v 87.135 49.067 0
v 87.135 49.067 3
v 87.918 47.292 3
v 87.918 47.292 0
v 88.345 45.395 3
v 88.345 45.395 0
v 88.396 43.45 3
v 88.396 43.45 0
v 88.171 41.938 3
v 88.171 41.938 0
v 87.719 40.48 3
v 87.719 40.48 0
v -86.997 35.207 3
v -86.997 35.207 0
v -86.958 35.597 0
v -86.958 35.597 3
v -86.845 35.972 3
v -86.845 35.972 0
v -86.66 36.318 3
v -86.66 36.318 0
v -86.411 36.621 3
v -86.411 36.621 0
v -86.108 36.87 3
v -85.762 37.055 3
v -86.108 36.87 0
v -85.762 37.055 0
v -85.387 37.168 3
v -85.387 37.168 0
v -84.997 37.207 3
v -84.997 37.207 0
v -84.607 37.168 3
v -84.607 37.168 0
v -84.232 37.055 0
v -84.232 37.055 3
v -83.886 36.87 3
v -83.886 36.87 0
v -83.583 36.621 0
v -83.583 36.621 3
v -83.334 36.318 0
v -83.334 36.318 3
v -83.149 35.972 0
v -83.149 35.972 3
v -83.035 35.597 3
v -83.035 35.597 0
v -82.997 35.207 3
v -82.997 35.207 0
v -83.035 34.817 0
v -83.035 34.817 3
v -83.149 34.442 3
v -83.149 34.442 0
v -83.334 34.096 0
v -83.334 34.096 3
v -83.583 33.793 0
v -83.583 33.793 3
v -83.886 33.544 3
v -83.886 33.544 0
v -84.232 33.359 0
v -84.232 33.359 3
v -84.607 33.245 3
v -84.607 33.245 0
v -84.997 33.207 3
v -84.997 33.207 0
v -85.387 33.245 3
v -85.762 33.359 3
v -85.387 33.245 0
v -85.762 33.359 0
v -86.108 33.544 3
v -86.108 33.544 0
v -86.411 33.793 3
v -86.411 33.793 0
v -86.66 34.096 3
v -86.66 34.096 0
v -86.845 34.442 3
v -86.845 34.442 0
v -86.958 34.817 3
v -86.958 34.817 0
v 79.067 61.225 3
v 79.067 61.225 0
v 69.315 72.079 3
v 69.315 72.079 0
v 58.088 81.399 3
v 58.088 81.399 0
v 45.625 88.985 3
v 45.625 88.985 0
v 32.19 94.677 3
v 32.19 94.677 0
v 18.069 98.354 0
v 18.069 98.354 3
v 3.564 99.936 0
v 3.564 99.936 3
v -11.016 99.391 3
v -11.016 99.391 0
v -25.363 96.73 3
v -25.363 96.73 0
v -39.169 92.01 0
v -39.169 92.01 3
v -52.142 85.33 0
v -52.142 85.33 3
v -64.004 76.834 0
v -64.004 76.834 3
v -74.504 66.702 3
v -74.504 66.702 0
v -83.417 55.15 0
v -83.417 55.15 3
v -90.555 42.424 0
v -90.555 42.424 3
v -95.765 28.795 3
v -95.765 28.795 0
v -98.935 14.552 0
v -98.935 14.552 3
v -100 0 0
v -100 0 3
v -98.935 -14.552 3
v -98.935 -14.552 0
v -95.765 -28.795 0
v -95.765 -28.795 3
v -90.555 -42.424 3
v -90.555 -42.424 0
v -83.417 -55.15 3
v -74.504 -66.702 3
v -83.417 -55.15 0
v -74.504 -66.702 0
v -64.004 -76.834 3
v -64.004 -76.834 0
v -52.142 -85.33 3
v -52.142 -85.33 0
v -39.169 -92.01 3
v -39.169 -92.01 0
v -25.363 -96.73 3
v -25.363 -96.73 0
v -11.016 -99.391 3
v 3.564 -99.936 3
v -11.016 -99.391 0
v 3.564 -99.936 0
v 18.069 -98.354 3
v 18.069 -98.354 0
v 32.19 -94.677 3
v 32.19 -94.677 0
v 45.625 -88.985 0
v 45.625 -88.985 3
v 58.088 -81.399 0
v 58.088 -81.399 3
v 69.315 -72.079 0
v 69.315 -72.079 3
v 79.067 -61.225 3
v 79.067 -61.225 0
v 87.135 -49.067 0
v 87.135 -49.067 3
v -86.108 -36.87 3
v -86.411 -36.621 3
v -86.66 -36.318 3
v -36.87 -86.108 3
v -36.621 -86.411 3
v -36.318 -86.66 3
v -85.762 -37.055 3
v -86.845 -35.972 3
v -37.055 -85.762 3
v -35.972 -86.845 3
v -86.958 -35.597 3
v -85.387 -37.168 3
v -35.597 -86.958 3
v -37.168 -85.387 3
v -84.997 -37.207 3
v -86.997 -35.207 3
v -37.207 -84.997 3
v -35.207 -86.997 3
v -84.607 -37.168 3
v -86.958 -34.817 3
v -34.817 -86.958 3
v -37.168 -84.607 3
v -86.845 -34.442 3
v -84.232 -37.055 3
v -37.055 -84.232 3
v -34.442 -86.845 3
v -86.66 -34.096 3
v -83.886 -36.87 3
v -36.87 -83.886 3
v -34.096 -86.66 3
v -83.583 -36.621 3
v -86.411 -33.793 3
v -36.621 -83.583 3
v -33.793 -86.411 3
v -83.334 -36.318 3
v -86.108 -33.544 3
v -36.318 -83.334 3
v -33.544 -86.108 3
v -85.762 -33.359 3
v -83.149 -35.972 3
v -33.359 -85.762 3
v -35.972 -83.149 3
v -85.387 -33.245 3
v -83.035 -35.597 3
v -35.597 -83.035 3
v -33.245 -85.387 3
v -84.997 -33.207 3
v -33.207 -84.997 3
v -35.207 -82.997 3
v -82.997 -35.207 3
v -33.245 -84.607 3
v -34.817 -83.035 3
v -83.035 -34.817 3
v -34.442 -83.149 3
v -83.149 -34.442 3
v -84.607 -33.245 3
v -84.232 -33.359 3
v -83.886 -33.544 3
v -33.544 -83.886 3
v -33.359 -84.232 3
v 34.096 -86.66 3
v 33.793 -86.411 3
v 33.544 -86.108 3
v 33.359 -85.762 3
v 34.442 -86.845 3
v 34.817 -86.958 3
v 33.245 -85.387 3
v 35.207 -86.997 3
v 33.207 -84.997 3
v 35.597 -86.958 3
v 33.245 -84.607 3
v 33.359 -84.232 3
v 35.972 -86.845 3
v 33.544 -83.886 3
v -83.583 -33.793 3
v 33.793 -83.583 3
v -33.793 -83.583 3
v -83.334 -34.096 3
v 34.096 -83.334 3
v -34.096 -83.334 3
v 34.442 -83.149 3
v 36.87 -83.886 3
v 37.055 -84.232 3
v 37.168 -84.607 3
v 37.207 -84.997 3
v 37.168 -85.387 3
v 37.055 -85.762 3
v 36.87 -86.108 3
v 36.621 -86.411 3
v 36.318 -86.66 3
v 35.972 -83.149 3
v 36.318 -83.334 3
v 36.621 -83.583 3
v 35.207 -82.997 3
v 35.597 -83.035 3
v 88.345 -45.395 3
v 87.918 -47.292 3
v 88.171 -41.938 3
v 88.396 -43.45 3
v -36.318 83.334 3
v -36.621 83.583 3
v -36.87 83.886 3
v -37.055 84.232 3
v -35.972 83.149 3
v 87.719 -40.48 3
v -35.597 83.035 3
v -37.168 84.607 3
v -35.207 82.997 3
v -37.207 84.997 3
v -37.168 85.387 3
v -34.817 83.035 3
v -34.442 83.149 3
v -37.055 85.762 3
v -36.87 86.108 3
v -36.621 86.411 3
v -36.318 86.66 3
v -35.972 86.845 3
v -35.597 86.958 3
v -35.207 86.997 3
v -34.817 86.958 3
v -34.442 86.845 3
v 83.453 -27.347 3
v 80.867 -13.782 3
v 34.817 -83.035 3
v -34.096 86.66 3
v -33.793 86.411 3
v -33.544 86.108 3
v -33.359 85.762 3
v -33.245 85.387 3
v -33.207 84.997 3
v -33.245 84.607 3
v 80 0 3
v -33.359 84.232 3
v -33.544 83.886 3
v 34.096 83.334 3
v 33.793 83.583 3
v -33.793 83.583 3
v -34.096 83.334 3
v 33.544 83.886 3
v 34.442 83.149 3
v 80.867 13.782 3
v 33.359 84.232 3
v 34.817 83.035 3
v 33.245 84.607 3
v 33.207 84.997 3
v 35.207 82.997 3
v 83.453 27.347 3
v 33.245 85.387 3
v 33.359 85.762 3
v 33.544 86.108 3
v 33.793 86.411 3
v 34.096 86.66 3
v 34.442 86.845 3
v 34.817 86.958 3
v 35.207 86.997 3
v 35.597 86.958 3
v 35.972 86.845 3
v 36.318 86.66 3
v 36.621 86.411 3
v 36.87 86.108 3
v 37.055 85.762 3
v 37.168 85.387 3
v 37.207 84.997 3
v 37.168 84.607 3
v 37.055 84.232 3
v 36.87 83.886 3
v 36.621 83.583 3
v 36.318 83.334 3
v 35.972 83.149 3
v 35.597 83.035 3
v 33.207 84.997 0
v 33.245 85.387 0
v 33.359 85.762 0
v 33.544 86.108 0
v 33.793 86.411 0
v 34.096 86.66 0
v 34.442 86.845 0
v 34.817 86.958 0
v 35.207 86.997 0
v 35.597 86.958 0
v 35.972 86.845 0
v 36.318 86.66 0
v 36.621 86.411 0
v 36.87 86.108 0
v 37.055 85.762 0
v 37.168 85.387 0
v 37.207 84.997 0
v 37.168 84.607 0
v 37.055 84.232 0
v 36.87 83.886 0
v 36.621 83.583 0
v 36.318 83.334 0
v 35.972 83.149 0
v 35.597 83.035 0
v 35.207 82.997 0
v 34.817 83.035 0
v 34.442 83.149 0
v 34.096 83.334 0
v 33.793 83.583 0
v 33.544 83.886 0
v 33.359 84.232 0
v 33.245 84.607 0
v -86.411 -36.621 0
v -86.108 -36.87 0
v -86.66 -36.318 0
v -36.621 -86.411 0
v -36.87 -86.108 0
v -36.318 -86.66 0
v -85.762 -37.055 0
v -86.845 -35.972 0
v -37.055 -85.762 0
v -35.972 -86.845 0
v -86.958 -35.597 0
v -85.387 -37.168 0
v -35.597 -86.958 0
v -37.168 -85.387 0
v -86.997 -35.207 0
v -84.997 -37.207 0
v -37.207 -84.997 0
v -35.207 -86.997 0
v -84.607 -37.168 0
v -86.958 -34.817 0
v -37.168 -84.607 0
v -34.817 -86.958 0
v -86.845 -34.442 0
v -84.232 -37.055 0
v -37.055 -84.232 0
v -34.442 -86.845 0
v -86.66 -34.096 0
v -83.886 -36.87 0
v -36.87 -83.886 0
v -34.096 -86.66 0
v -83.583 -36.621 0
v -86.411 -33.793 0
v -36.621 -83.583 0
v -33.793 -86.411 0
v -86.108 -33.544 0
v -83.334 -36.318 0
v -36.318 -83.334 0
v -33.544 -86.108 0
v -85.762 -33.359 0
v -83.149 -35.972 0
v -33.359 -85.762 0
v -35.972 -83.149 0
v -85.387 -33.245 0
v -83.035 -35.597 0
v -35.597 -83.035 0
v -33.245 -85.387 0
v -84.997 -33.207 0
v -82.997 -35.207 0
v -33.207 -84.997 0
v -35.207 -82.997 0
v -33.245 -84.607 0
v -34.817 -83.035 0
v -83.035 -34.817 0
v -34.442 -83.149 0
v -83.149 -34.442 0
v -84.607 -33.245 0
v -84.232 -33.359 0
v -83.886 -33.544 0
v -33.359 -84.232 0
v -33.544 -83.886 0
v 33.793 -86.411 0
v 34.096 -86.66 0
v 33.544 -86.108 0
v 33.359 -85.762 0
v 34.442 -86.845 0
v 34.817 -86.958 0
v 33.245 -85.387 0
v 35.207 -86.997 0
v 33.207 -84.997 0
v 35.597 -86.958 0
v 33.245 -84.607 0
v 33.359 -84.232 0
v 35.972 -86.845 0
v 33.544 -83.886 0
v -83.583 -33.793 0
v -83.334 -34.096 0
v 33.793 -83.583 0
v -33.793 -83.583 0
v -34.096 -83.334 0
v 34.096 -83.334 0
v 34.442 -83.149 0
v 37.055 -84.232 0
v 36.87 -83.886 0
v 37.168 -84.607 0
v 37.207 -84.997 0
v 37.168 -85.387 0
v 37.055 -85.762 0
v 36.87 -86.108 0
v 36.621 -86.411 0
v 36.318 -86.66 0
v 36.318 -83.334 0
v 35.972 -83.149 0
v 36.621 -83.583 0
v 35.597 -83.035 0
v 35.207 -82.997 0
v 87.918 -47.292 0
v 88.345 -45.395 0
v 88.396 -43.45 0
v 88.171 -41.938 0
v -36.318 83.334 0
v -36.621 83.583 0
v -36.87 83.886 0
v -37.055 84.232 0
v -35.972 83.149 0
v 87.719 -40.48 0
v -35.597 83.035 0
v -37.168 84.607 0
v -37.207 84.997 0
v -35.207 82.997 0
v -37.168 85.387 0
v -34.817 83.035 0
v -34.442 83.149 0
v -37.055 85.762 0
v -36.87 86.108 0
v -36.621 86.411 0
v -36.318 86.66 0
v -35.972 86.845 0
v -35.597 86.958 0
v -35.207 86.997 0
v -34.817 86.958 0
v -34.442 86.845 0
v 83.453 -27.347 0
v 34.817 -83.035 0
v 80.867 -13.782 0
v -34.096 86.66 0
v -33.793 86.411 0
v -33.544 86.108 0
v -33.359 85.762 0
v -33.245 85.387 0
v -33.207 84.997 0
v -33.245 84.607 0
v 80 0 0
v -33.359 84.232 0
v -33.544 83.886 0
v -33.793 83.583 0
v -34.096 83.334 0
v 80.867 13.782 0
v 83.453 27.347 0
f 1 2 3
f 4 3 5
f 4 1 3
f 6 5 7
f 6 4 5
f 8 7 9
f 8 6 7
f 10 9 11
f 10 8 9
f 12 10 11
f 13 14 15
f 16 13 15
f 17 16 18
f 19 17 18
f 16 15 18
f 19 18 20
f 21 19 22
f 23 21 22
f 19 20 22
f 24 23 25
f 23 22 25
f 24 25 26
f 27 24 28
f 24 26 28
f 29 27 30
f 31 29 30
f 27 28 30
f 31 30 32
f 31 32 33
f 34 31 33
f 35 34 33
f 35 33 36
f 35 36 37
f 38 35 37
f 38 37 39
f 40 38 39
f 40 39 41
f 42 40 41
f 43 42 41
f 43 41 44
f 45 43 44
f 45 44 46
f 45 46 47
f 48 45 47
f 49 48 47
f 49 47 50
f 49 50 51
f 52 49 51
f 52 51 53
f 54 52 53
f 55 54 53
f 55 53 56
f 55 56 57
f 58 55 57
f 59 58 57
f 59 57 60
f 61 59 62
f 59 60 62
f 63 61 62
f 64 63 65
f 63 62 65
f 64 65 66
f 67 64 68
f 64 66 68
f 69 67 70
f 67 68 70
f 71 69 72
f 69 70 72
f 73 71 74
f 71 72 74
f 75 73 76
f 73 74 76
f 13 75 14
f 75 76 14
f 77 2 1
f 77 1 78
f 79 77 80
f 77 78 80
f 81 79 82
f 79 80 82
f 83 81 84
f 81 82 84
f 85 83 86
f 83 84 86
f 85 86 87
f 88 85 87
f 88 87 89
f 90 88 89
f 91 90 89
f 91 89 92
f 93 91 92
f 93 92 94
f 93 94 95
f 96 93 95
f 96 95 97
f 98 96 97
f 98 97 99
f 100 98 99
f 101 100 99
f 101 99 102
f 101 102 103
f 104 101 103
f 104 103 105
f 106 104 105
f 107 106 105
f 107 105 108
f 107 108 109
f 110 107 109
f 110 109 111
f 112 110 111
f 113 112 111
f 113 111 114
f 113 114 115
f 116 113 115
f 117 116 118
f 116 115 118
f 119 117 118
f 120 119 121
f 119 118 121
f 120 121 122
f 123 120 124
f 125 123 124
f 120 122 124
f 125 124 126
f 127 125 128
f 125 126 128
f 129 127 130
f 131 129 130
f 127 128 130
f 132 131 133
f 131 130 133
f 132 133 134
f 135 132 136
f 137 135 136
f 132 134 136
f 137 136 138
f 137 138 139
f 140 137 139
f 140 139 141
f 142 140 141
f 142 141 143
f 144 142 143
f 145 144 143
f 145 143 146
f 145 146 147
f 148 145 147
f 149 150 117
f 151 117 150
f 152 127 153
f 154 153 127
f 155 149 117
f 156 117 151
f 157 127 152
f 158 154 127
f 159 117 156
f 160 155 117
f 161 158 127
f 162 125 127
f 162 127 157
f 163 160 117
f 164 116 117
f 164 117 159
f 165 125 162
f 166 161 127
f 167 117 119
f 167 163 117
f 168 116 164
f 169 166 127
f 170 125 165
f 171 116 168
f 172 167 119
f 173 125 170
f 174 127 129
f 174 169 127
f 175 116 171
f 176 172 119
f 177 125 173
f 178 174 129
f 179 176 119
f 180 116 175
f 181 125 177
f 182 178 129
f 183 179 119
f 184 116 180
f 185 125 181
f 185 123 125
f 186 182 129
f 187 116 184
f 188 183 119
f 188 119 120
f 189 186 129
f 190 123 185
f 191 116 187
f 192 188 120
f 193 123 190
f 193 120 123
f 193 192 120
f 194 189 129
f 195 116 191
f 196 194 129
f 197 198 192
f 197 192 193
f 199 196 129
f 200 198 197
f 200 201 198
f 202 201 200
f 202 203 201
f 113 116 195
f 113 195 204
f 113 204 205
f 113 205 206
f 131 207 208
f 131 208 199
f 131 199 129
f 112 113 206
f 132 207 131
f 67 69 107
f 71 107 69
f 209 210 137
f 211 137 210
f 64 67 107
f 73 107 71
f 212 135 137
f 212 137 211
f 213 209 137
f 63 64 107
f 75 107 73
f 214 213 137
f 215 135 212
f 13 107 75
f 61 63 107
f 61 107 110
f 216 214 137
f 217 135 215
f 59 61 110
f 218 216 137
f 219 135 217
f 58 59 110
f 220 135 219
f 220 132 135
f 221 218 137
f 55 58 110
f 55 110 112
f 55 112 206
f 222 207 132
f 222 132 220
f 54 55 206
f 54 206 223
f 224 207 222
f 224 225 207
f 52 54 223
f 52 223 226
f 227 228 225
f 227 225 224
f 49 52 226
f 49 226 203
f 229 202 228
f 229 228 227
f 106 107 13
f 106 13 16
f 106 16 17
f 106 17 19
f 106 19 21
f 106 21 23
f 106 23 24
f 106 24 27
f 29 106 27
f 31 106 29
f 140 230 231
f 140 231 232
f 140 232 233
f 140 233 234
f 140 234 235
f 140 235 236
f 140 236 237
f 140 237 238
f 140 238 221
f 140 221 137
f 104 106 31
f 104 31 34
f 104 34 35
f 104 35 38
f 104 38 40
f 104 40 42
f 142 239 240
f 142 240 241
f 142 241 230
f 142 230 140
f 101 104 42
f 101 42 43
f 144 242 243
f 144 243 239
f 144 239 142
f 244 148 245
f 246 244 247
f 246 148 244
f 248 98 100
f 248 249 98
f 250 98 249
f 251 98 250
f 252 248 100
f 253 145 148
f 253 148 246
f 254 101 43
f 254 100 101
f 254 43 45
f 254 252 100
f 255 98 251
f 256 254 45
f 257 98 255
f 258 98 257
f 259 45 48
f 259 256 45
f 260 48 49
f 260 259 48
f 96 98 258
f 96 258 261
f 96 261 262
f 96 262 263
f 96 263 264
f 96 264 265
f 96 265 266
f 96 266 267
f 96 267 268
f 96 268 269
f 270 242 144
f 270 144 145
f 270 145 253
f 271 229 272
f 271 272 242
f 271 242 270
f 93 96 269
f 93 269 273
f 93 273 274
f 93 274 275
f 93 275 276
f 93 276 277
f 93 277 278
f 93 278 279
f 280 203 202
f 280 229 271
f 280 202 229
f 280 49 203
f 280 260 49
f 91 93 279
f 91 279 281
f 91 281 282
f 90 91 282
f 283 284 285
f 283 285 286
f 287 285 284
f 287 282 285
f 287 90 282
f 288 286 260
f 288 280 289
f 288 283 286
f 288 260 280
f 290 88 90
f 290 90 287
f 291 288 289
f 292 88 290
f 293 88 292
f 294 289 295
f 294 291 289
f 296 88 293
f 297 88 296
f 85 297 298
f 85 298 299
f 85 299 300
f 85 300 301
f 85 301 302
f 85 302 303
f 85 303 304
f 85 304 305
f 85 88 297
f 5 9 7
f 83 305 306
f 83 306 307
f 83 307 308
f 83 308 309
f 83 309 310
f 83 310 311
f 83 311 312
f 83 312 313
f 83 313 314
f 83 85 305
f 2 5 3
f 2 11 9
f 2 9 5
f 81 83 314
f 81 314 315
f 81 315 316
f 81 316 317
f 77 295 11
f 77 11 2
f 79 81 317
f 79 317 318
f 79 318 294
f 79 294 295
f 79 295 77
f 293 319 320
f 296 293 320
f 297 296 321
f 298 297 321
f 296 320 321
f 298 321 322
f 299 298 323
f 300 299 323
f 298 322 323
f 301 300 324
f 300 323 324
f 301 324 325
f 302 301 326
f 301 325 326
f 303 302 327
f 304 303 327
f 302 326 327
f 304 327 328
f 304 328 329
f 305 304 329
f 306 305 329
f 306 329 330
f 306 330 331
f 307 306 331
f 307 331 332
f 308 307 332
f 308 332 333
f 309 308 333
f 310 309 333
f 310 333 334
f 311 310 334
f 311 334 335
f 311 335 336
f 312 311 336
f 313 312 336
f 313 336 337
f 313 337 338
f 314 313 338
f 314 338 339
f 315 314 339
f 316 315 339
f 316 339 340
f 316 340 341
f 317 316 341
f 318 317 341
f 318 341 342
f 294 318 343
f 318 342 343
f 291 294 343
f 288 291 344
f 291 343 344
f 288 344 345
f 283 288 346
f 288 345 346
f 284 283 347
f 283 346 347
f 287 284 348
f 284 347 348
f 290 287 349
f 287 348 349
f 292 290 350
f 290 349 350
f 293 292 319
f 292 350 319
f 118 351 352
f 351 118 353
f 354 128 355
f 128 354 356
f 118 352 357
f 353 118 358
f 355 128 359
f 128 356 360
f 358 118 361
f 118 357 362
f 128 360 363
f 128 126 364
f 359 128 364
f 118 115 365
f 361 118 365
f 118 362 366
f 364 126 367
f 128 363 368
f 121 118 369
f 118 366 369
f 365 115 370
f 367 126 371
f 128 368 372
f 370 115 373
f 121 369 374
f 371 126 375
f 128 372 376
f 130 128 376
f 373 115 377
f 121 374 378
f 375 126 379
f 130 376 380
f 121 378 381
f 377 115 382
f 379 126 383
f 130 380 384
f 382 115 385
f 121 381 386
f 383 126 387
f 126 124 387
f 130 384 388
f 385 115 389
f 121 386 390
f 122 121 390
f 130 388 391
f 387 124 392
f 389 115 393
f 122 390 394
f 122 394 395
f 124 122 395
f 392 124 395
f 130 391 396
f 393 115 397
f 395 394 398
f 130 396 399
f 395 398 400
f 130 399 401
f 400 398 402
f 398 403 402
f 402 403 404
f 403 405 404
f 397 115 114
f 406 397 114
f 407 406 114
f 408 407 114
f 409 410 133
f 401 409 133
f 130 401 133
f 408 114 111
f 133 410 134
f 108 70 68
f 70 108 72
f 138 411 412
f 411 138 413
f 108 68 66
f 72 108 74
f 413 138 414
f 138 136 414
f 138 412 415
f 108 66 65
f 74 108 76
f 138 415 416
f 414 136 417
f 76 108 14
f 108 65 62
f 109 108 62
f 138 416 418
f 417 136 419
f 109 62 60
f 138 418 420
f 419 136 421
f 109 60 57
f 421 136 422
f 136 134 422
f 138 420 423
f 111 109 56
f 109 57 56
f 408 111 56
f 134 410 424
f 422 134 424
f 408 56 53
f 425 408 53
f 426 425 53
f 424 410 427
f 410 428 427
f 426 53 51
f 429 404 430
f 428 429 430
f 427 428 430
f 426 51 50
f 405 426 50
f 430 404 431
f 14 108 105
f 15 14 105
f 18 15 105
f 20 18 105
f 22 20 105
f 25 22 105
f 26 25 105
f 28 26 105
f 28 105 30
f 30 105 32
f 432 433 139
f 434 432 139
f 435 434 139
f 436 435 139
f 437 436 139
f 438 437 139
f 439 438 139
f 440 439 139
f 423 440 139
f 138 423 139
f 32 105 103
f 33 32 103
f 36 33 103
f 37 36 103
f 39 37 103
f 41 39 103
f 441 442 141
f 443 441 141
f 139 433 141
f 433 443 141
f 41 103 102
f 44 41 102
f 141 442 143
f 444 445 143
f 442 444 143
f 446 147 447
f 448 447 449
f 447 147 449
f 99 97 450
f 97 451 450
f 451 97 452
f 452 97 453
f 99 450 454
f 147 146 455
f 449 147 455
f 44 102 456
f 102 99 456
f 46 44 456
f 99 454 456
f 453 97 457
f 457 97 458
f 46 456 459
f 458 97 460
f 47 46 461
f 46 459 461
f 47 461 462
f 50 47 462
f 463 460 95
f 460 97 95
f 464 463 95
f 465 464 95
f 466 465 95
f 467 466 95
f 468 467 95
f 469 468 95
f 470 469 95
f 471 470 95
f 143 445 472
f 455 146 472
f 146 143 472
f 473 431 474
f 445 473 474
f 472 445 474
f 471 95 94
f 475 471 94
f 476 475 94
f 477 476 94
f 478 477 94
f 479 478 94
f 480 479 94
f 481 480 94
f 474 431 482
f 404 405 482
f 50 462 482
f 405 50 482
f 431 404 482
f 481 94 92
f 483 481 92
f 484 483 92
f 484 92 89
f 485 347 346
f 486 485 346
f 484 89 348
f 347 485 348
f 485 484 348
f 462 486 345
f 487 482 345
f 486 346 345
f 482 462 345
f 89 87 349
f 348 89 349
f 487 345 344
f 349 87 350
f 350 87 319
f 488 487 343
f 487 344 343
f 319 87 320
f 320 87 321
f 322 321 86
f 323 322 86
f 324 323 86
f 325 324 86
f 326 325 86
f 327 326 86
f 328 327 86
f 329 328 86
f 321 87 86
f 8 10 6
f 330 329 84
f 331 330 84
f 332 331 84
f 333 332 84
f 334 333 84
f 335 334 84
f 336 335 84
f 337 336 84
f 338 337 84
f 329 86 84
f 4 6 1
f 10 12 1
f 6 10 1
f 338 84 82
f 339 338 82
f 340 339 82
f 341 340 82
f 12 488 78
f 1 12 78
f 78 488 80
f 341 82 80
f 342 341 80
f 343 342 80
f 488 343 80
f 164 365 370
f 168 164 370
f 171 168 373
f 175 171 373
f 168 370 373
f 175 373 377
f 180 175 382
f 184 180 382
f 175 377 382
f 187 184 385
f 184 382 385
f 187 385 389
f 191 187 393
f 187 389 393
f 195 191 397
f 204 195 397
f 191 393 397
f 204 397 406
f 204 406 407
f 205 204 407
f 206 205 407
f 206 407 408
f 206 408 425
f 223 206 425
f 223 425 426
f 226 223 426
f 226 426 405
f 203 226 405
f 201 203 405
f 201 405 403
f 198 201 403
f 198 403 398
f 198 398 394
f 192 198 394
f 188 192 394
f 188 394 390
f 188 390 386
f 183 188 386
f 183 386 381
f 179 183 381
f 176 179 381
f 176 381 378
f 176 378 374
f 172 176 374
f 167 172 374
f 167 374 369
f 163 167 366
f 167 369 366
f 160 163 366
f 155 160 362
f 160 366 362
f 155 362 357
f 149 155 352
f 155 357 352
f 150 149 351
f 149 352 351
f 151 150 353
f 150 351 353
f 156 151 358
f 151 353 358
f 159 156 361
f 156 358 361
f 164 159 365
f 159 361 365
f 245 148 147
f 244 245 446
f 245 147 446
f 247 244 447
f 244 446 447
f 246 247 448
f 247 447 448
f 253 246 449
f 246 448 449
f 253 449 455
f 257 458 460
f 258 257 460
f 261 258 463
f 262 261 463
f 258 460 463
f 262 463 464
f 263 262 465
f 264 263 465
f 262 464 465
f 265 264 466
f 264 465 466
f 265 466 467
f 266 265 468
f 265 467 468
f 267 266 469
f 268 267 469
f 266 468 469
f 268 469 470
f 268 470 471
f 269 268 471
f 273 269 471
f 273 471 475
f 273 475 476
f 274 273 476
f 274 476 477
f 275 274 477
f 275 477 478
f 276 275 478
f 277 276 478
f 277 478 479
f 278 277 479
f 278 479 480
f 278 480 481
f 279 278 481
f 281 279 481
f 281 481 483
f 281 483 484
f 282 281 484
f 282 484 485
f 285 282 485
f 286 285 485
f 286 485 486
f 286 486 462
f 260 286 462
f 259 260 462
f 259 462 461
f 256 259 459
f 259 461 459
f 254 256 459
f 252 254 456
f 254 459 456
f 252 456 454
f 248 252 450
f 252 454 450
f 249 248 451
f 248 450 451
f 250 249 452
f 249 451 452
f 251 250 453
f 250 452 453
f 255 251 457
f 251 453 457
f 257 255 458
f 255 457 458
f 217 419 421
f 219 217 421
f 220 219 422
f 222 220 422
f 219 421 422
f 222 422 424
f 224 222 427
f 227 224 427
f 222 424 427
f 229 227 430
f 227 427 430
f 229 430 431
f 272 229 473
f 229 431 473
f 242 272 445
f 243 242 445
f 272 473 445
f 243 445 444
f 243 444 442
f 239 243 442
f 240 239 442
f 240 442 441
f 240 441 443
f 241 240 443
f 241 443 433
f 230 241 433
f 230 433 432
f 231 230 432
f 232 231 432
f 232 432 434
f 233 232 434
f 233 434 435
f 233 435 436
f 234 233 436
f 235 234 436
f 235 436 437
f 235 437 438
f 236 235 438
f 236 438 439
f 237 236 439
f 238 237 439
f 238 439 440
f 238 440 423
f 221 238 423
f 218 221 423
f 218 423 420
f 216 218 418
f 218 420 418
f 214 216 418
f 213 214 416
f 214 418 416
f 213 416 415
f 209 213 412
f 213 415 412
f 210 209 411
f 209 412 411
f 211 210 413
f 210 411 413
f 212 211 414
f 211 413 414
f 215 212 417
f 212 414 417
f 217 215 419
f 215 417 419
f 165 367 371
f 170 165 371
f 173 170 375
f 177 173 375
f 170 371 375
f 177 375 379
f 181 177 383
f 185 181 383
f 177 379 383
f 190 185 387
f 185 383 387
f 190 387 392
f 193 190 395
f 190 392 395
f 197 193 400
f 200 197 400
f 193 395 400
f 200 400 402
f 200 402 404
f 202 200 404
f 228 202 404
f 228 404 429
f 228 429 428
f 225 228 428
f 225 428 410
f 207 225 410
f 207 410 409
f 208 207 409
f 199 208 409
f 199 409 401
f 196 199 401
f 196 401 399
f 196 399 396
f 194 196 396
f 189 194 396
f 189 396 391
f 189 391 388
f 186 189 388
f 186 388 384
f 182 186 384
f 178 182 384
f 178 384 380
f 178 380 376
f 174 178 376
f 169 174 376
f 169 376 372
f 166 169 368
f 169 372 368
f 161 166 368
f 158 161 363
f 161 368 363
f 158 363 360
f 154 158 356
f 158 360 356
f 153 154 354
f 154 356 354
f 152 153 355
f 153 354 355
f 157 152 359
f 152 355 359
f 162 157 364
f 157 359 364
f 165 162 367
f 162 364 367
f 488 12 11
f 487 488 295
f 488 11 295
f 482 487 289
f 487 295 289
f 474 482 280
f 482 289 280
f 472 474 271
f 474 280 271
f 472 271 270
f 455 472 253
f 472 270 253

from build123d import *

# Parameters (mm, degrees)
CROQUIS1_R              = 100
SALIENTE_EXTRUIR1_DEPTH = 3
CROQUIS3_R              = 110
CORTAR_EXTRUIR1_DEPTH   = 3
REDONDEO1_R             = 10
CROQUIS4_R              = 2
CORTAR_EXTRUIR2_DEPTH   = 142.453172607


with BuildPart() as part:
    # Croquis1 → Saliente-Extruir1 (new body)
    with BuildSketch(Plane.XY):
        Circle(CROQUIS1_R)
    extrude(amount=SALIENTE_EXTRUIR1_DEPTH)

    # Croquis3 → Cortar-Extruir1 (cut)
    with BuildSketch(Plane.XY.offset(3)):
        with Locations((190, 0)):
            Circle(CROQUIS3_R)
    extrude(amount=-CORTAR_EXTRUIR1_DEPTH, mode=Mode.SUBTRACT)

    # Redondeo1
    redondeo1_edges = [part.edges().sort_by_distance(p)[0] for p in [
        (89.473684211, -44.659375654, 1.5),
        (89.473684211, 44.659375654, 1.5),
    ]]
    fillet(redondeo1_edges, radius=REDONDEO1_R)

    # Croquis4 → Cortar-Extruir2 (cut, through all)
    with BuildSketch(Plane(origin=(0, 0, 0), x_dir=(-1, 0, 0), z_dir=(0, 0, -1))):
        with Locations((-35.206875778, 84.996916991)):
            Circle(CROQUIS4_R)
        with Locations((35.206875778, 84.996916991)):
            Circle(CROQUIS4_R)
        with Locations((84.996916991, 35.206875778)):
            Circle(CROQUIS4_R)
        with Locations((84.996916991, -35.206875778)):
            Circle(CROQUIS4_R)
        with Locations((35.206875778, -84.996916991)):
            Circle(CROQUIS4_R)
        with Locations((-35.206875778, -84.996916991)):
            Circle(CROQUIS4_R)
    extrude(amount=-CORTAR_EXTRUIR2_DEPTH, mode=Mode.SUBTRACT)


solid = part.part
